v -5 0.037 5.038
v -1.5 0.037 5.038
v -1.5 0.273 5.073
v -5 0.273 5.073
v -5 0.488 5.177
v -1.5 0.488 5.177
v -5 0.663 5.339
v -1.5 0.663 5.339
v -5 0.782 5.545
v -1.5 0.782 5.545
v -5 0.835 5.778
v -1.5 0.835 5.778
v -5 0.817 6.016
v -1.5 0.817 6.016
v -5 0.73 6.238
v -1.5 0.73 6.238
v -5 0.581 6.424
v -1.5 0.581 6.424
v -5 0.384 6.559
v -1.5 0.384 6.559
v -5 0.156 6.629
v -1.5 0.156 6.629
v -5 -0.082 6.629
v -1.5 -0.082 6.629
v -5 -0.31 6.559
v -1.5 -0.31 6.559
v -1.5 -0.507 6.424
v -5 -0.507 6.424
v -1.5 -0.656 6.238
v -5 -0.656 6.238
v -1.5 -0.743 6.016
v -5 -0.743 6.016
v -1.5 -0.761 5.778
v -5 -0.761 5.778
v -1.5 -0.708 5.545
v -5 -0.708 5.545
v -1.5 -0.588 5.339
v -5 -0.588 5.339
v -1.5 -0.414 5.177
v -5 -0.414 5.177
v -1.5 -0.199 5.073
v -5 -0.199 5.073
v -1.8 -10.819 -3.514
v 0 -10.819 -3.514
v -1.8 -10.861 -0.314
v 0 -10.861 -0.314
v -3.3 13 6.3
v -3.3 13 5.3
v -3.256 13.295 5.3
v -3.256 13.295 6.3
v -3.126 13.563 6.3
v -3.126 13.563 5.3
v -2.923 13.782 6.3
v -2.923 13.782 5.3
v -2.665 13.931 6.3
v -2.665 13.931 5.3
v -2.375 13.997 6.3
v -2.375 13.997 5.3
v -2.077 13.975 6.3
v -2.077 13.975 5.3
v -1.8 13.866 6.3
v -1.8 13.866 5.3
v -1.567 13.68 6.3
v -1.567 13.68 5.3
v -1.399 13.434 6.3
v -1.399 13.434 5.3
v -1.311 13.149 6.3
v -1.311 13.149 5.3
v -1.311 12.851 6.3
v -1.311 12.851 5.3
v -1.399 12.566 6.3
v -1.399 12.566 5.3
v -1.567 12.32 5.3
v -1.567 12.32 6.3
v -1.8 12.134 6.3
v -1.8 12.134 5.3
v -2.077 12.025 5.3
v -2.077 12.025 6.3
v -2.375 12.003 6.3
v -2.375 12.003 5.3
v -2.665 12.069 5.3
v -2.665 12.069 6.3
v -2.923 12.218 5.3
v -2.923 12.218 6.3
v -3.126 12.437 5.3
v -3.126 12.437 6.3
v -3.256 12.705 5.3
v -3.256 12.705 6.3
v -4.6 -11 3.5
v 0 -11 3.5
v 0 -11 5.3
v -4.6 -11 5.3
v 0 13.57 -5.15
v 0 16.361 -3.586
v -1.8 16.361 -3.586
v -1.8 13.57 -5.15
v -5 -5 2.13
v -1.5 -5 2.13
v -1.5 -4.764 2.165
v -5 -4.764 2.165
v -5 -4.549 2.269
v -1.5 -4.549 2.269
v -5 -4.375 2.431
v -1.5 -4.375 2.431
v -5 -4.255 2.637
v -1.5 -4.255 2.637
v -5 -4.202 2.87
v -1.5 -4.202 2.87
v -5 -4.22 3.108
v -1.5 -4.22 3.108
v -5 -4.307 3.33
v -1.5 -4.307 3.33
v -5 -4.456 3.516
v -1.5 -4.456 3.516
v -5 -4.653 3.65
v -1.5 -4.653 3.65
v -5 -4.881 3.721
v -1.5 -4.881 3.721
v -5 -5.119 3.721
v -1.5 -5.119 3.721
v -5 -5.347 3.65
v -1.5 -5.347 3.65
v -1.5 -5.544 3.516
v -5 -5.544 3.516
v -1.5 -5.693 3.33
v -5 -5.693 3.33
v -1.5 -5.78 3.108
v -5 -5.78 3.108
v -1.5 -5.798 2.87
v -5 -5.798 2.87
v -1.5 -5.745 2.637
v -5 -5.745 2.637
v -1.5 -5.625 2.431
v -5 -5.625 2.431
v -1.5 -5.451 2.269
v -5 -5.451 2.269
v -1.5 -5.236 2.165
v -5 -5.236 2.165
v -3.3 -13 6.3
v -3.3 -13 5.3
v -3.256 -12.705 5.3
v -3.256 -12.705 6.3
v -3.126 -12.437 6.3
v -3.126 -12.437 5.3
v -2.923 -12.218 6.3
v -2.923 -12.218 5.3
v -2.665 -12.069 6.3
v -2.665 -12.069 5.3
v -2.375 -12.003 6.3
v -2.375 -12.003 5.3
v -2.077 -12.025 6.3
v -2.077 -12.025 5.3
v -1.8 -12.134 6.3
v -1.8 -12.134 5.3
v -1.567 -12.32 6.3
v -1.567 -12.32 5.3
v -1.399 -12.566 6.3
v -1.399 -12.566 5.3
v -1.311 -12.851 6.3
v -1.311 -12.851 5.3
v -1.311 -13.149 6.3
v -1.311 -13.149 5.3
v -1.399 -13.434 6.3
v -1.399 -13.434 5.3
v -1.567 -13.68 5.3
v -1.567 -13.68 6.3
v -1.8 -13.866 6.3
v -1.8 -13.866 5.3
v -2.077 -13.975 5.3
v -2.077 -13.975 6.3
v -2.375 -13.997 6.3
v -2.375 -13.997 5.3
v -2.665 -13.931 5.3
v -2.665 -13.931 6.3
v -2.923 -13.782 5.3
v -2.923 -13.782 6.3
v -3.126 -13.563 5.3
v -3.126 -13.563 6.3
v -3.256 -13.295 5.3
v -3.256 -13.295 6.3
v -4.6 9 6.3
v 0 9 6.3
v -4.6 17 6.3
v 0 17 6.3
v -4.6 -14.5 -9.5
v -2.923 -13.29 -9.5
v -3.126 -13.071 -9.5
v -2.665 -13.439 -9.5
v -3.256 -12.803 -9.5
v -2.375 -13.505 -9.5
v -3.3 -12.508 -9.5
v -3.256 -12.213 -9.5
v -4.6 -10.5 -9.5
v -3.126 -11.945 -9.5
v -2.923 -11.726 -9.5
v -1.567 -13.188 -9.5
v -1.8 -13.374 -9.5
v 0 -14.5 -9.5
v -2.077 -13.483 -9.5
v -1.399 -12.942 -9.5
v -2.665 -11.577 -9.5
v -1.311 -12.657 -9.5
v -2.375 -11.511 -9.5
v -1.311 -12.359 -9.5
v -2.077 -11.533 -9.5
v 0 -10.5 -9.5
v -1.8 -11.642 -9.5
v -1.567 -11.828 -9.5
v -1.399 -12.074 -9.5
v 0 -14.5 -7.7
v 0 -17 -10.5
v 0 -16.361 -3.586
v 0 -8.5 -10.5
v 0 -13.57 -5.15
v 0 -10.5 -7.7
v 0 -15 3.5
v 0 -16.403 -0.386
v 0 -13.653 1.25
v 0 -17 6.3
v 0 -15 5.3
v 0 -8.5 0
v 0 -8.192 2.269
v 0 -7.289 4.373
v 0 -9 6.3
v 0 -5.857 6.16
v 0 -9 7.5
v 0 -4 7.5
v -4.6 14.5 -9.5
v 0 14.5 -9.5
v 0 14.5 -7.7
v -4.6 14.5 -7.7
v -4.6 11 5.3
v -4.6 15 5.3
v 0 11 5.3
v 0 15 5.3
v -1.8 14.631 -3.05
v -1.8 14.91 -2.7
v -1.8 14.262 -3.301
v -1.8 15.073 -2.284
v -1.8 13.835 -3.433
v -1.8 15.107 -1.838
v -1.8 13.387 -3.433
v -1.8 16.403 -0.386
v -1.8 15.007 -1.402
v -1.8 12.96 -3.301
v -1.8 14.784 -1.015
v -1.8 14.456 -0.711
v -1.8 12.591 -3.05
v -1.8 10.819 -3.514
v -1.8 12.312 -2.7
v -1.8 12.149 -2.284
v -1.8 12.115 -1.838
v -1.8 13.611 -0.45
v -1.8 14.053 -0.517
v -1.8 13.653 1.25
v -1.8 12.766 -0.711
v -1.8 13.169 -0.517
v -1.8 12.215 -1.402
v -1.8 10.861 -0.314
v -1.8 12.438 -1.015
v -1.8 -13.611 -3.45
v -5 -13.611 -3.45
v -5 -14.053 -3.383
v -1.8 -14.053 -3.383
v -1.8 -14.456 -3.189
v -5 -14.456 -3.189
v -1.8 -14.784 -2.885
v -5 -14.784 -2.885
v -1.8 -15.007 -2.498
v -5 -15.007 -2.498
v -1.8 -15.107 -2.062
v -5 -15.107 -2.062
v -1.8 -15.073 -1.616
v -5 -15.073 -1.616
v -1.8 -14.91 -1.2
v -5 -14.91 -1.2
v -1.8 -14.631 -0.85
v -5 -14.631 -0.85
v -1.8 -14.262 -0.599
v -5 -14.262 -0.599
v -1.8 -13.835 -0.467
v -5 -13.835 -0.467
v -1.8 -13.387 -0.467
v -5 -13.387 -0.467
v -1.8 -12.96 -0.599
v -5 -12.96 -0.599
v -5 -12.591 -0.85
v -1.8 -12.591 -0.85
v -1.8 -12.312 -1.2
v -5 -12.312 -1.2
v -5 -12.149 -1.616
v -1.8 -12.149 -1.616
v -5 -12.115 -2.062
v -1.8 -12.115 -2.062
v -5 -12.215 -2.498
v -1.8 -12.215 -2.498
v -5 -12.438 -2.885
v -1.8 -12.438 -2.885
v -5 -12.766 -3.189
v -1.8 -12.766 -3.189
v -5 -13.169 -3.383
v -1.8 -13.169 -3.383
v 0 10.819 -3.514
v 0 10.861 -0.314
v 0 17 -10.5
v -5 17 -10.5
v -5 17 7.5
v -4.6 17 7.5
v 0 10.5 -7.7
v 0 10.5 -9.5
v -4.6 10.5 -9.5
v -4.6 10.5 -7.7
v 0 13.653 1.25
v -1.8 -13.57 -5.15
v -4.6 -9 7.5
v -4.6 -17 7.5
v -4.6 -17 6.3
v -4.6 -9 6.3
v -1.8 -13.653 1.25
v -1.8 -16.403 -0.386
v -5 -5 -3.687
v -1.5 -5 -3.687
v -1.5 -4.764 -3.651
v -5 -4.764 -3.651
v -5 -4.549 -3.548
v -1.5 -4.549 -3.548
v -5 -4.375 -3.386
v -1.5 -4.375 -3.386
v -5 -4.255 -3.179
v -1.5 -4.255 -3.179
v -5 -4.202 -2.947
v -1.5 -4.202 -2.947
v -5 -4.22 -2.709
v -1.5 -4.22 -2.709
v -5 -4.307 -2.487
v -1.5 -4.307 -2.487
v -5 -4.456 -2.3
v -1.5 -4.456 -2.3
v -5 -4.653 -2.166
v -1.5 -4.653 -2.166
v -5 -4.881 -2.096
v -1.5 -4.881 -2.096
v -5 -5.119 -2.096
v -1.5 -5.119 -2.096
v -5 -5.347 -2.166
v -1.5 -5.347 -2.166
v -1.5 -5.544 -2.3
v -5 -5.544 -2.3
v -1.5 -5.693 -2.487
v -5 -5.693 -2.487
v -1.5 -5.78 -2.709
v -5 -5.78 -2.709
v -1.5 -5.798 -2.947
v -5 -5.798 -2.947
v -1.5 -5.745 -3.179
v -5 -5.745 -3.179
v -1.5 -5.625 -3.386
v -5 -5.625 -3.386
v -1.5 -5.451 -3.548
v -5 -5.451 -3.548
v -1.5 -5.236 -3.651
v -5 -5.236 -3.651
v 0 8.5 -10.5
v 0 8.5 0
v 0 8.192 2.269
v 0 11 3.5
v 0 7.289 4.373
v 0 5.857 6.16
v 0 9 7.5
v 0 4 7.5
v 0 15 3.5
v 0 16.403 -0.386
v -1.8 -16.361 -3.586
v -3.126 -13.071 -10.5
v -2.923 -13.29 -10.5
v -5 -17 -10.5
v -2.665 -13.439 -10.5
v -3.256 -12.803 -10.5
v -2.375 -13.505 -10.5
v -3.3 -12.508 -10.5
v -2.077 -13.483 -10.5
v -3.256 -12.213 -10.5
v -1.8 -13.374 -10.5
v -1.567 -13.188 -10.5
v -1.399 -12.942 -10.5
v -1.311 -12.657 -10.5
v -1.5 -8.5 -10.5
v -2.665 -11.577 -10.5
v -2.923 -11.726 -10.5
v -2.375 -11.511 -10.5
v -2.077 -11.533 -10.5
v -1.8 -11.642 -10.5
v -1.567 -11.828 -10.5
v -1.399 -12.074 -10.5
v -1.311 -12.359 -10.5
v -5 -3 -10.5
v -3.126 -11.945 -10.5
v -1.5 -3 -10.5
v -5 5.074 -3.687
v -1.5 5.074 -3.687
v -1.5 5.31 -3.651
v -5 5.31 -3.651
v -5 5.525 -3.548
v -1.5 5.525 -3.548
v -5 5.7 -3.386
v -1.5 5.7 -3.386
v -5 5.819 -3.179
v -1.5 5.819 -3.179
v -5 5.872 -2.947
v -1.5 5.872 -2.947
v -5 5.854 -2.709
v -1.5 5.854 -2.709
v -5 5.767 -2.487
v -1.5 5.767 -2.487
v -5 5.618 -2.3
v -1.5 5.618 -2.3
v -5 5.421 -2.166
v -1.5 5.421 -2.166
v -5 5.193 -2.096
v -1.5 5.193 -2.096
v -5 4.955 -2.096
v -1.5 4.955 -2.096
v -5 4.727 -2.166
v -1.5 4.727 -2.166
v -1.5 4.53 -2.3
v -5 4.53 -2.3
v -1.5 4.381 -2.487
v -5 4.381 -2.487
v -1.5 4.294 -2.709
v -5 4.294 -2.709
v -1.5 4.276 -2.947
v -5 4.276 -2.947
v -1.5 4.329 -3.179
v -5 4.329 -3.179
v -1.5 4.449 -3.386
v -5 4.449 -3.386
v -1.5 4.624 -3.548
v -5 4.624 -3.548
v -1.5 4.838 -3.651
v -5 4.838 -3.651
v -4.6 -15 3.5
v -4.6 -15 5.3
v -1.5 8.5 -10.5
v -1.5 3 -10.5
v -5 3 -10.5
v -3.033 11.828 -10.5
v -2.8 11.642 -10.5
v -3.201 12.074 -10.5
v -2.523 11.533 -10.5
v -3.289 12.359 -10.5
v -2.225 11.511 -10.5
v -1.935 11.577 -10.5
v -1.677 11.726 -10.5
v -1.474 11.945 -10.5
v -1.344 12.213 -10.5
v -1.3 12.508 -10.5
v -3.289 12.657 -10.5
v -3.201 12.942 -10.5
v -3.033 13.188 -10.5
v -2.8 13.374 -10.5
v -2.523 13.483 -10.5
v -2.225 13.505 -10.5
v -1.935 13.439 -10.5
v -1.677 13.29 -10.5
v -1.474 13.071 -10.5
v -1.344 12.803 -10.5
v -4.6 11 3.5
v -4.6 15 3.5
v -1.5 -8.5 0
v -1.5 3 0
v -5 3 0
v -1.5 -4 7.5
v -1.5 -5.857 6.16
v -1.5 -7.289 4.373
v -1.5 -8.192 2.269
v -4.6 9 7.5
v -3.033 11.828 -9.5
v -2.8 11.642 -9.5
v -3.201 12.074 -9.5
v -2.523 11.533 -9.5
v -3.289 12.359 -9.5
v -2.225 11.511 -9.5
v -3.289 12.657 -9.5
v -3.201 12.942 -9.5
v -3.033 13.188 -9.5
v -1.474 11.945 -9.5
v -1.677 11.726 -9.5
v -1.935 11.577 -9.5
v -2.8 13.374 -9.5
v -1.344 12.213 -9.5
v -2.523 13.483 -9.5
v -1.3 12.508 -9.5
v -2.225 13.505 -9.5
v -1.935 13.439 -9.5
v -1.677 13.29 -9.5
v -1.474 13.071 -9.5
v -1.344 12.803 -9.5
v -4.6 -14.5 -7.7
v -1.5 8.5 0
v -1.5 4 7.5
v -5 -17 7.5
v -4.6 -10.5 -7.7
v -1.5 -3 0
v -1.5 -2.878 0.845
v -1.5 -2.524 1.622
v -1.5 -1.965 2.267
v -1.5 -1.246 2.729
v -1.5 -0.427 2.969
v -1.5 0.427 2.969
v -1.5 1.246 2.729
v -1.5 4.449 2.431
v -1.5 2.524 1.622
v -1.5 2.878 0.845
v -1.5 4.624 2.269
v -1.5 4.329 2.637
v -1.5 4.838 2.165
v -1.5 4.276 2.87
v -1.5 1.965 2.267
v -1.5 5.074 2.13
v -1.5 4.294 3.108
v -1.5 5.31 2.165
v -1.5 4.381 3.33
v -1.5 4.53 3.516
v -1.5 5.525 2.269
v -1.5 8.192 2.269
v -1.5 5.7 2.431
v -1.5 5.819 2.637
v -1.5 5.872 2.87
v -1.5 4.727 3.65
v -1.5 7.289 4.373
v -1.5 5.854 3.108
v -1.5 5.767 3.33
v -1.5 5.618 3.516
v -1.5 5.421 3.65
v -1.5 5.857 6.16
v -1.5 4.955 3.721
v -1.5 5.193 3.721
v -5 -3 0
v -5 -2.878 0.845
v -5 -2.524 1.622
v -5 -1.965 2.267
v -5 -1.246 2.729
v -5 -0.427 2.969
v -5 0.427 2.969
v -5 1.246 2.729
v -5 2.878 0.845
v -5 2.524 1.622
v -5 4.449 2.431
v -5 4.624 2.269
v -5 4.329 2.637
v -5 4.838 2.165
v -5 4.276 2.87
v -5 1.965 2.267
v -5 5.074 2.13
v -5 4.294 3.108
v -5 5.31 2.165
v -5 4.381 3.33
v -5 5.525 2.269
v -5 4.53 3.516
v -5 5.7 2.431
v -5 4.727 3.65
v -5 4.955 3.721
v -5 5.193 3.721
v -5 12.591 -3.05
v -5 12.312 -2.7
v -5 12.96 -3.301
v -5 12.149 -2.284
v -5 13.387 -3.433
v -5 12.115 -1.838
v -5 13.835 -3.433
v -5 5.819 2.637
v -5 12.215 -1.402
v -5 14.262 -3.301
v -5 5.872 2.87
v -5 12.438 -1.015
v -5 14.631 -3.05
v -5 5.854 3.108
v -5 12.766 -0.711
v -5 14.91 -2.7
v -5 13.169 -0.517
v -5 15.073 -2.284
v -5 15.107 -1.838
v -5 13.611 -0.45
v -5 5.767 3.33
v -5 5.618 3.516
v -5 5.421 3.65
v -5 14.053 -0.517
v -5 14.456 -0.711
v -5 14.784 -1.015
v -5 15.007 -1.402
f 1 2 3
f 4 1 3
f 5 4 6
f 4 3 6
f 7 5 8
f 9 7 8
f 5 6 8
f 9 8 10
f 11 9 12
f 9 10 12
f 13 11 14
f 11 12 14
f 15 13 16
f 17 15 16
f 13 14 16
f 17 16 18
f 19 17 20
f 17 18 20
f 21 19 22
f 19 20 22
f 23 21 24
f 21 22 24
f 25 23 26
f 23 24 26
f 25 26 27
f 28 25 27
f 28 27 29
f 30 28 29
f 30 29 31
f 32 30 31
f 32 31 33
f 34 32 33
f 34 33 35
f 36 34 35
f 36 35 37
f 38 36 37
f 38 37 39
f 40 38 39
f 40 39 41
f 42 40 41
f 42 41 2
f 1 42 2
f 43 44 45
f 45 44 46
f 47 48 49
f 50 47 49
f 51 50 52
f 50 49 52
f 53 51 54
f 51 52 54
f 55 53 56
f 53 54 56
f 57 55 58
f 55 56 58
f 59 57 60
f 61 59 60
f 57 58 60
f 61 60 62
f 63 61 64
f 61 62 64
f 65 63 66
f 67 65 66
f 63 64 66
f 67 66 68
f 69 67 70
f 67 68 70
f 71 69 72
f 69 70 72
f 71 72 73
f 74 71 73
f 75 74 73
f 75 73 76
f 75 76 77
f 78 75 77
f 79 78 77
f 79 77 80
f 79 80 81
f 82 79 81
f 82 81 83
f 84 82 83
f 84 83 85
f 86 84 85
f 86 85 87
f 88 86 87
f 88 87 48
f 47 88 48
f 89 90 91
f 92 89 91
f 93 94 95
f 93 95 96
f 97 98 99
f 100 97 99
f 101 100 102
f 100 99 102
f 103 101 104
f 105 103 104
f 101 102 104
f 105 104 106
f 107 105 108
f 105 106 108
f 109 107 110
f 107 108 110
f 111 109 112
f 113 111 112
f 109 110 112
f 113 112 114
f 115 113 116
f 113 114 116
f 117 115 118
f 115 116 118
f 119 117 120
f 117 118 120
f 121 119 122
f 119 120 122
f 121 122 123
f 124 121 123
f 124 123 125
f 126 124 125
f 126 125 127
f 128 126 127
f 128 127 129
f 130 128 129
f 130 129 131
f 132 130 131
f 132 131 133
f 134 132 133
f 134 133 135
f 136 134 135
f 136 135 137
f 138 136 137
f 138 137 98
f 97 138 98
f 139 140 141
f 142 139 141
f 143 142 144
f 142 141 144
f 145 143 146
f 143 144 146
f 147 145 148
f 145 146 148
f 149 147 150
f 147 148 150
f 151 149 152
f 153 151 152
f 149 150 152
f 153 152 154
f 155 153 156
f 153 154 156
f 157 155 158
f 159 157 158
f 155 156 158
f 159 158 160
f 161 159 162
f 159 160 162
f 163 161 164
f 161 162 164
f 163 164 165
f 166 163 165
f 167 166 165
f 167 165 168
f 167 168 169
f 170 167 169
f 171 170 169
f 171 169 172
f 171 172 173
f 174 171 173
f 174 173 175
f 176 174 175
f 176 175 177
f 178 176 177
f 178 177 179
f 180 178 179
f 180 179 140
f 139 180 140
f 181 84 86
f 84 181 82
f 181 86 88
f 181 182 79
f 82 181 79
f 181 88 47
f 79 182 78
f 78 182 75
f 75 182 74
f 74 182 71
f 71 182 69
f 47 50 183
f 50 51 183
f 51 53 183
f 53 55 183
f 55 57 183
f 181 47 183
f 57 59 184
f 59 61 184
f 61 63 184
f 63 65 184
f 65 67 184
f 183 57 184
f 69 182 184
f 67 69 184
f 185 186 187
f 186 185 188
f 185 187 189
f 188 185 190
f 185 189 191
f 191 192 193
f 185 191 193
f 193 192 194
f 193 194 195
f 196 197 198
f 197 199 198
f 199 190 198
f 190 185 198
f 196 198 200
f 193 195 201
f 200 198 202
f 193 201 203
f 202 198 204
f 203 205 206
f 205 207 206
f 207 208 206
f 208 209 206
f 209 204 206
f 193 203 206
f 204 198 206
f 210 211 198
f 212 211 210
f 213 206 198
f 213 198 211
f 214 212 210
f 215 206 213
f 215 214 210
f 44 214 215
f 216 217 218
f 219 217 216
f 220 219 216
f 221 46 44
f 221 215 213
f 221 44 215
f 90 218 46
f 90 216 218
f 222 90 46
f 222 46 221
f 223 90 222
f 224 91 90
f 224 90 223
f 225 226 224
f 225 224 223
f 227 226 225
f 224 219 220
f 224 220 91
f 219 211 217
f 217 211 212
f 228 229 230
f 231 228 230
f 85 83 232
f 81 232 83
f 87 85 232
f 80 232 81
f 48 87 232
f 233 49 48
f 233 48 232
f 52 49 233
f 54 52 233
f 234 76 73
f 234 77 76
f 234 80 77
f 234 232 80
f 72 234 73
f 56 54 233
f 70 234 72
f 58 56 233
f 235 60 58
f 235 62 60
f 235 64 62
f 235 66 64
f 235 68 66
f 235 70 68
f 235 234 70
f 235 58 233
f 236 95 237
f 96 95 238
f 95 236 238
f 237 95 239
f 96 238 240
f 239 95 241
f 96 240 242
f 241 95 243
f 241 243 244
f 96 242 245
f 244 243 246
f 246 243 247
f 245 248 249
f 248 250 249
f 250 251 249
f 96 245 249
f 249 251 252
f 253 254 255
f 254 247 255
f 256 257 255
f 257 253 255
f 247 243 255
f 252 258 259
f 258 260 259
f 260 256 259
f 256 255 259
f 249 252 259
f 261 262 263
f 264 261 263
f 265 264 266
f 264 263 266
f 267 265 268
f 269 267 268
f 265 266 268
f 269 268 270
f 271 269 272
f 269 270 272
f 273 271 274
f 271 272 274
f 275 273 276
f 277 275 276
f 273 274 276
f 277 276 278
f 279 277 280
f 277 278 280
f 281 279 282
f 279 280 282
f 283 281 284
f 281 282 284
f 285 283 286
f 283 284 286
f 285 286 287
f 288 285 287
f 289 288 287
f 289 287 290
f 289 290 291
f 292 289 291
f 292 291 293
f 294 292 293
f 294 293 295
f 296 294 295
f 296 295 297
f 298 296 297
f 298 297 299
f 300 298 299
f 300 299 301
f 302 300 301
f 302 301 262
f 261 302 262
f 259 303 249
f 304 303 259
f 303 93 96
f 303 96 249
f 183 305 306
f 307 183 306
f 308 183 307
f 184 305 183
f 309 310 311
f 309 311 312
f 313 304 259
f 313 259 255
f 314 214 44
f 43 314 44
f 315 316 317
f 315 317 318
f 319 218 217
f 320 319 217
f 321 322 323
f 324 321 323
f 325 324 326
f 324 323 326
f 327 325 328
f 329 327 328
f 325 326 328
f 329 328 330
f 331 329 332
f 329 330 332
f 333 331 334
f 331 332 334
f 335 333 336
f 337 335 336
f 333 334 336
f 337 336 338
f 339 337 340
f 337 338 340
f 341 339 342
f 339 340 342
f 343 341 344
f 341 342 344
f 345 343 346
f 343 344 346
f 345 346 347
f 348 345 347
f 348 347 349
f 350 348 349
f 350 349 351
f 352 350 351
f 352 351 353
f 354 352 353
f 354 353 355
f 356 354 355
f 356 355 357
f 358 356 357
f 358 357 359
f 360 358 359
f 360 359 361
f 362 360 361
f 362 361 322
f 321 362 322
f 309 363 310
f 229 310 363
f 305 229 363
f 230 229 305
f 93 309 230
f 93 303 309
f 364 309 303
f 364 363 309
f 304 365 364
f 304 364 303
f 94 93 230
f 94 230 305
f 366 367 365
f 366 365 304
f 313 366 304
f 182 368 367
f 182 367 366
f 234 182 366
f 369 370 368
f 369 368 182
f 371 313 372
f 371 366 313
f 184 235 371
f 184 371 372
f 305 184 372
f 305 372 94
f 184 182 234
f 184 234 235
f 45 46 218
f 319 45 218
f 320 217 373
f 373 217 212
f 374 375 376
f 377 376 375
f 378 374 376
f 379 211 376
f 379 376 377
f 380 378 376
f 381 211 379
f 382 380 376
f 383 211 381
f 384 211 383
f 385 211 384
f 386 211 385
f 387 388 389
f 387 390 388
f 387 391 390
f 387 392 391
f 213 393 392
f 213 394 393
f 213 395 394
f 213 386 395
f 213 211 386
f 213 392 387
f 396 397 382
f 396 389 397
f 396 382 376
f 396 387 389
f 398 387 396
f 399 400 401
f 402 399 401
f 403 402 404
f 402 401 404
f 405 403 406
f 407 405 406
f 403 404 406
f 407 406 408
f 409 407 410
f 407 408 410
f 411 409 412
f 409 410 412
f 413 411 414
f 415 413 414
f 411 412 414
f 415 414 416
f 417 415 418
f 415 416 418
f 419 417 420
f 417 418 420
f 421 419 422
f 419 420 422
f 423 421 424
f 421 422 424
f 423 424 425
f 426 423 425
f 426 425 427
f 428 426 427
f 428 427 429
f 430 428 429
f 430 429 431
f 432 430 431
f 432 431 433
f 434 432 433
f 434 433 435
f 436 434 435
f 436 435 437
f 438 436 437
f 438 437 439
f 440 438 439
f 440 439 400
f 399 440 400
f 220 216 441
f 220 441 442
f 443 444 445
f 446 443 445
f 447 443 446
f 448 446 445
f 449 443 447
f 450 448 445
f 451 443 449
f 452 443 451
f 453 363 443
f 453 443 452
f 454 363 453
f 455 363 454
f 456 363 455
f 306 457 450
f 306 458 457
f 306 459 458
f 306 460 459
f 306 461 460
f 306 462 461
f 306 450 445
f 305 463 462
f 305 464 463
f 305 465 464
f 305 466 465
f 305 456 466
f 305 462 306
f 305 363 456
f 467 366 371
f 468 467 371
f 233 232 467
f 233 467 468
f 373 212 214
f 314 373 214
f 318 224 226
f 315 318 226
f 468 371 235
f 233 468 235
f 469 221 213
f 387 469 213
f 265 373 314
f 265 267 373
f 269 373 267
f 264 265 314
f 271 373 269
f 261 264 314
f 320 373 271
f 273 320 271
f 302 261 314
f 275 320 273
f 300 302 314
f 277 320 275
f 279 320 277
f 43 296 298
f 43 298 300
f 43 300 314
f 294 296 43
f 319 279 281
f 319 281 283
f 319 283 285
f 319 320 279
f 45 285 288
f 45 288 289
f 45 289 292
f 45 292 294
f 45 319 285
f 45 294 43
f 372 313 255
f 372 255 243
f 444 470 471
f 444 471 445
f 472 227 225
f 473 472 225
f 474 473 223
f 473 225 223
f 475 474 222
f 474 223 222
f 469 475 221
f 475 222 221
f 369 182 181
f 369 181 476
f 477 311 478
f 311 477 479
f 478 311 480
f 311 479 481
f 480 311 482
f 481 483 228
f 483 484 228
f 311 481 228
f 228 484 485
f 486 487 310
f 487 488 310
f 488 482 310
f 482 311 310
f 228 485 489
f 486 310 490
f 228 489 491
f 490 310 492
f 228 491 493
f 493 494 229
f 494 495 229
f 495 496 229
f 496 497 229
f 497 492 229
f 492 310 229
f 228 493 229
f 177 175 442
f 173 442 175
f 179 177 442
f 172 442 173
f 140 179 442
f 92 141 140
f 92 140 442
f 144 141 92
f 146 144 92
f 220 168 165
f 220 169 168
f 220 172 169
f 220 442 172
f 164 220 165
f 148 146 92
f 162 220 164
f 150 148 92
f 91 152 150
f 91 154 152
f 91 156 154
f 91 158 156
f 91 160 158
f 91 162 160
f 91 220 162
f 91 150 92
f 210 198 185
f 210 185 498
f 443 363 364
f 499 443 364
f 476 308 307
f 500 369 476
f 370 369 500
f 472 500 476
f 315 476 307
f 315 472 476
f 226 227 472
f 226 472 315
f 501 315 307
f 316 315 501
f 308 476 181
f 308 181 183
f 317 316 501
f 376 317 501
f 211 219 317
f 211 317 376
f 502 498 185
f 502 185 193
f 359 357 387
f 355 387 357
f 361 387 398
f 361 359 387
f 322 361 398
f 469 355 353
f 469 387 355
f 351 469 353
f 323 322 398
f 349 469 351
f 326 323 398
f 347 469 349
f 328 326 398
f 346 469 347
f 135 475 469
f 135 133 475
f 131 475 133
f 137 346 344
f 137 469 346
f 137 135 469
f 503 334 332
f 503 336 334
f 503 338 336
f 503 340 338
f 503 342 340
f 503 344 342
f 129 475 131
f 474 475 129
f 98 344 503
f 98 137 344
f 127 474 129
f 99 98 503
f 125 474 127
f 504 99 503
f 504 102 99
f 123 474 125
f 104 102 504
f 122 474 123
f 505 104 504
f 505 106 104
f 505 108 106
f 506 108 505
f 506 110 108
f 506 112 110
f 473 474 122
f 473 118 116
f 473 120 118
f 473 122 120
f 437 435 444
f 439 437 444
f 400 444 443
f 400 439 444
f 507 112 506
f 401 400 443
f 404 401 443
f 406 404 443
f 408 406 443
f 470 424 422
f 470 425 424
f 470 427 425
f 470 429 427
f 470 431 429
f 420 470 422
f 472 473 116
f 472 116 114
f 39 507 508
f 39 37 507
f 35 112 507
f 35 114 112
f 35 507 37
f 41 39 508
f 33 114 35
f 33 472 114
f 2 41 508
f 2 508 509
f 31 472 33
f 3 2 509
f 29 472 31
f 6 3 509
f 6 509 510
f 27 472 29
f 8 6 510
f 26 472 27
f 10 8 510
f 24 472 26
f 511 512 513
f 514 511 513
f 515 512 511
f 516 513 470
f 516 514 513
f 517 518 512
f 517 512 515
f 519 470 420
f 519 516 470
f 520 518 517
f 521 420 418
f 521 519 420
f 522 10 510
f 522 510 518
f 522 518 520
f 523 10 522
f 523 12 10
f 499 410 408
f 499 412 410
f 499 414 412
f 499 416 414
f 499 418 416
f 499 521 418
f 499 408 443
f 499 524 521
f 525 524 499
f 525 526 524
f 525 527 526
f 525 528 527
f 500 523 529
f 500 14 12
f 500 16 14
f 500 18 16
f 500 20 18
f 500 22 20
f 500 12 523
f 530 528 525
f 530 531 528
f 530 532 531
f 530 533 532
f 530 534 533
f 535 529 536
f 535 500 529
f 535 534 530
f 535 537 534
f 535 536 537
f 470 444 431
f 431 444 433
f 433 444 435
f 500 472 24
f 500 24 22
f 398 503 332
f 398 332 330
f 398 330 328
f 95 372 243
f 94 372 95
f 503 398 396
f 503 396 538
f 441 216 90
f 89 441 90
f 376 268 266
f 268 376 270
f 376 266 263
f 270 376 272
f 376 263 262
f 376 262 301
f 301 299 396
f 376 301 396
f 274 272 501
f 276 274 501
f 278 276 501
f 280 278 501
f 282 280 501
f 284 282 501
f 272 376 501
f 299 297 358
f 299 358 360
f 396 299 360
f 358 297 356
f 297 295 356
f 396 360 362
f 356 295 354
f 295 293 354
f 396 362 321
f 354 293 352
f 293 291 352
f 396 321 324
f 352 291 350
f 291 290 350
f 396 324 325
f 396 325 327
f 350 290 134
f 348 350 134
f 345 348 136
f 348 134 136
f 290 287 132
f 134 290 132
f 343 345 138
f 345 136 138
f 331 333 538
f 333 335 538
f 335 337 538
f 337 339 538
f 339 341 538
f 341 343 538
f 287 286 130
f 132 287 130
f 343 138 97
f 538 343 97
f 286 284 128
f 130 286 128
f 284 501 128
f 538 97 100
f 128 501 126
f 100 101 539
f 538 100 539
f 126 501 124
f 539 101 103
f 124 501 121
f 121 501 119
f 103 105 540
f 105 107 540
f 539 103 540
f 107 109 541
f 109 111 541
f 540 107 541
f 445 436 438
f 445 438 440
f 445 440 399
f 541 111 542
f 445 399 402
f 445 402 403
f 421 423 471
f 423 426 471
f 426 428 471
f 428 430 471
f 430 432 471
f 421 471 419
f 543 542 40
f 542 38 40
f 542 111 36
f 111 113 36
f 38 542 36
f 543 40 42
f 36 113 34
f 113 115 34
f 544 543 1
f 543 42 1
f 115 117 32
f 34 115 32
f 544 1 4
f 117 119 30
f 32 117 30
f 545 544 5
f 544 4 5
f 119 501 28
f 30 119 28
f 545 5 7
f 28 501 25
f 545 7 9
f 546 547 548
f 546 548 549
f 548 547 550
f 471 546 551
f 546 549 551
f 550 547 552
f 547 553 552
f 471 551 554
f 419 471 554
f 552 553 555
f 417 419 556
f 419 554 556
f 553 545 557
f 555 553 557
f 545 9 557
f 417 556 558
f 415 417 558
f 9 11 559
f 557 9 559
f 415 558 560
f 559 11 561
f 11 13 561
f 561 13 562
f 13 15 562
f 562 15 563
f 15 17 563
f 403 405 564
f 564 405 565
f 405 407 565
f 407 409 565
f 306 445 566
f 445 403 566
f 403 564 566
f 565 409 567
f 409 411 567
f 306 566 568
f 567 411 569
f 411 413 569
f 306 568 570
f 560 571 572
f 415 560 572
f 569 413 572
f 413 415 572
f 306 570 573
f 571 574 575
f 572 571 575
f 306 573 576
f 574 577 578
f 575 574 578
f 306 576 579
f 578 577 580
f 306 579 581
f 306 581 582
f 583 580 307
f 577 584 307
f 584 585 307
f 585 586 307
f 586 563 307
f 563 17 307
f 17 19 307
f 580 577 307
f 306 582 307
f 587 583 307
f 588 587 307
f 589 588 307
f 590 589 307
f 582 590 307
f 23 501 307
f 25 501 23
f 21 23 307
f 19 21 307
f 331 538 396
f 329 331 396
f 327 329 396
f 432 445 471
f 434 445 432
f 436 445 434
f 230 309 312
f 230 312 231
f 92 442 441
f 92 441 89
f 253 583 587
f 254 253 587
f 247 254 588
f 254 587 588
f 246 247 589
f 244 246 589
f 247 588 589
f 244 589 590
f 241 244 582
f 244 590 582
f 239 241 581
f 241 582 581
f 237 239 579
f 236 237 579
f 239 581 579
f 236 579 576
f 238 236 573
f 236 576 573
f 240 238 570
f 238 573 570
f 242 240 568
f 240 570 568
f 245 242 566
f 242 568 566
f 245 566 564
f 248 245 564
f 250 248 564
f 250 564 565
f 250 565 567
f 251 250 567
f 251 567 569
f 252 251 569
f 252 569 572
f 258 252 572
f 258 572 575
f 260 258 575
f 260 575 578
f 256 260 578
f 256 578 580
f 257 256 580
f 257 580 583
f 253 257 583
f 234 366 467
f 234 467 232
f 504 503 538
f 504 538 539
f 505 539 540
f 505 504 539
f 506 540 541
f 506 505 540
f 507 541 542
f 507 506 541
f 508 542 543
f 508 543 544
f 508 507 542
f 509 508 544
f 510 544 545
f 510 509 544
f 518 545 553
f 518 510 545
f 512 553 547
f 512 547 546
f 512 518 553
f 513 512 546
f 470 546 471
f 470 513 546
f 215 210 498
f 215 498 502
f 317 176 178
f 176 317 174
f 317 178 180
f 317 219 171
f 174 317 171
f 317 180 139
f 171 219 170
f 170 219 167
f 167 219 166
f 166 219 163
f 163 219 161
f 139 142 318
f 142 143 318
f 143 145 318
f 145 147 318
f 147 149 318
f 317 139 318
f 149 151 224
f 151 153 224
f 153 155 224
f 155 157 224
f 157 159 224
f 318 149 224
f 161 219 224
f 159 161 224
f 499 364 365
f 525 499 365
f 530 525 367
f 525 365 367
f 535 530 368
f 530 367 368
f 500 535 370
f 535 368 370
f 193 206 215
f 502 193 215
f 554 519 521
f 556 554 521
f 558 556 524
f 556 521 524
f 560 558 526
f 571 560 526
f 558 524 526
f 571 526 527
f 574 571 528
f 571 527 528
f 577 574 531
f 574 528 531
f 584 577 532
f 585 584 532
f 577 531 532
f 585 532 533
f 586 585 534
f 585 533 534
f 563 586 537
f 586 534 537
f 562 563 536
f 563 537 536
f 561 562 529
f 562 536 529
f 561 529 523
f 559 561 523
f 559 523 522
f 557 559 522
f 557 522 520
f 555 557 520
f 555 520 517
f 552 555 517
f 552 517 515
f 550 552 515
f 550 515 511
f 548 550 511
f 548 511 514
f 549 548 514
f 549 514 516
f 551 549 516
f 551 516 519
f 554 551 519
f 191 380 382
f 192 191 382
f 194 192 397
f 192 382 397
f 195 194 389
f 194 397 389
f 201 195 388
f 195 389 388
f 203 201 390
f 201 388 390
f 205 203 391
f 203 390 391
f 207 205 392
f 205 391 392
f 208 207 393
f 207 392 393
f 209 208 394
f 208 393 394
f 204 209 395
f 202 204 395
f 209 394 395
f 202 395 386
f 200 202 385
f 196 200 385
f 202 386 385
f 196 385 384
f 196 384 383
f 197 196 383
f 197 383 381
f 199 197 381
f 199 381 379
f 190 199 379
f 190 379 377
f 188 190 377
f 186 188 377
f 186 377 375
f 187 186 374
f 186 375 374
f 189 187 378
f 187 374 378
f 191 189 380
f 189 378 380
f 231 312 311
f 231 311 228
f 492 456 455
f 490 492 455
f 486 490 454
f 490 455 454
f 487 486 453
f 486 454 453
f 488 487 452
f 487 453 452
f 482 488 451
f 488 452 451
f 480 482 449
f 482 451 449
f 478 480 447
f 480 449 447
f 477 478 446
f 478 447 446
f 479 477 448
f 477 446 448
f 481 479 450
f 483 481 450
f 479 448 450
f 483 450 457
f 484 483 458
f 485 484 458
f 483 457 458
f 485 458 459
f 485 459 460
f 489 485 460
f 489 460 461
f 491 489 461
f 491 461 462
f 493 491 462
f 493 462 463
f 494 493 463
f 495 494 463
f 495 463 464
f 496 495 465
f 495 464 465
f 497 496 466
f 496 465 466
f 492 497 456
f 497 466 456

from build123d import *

# Parameters (mm, degrees)
SKETCH_1_R          = 0.8
EXTRUDE_5_DEPTH     = 5
SKETCH_6_R          = 0.8
CUT_EXTRUDE_1_DEPTH = 1.5
SKETCH_7_R          = 1.5
CUT_EXTRUDE_2_DEPTH = 21.597329924
CUT_EXTRUDE_4_DEPTH = 1.8
SKETCH_9_R          = 1
CUT_EXTRUDE_5_DEPTH = 1
SKETCH_10_W         = 4
SKETCH_10_H         = 1.8
SKETCH_10_W_2       = 8
SKETCH_10_H_2       = 1.2
CUT_EXTRUDE_6_DEPTH = 4.6
SKETCH_12_R         = 1
CUT_EXTRUDE_7_DEPTH = 24.741103597


with BuildPart() as part:
    # ｽｹｯﾁ1 → ﾎﾞｽ - 押し出し5 (new body)
    # profile 1 of 3: a face of its own
    with BuildSketch(Plane.YZ):
        with BuildLine():
            Line((-3, -10.5), (-3, -7.95298686))
            ThreePointArc((-3, -7.95298686), (-8.482257997, -0.548907345), (-4, 7.5))
            Line((-4, 7.5), (-17, 7.5))
            Line((-17, 7.5), (-17, -10.5))
            Line((-17, -10.5), (-3, -10.5))
        make_face()
    # profile 2 of 3: a face of its own
    with BuildSketch(Plane.YZ):
        with BuildLine():
            ThreePointArc((-3, 0), (0, 3), (3, 0))
            Line((3, 0), (3, -7.95298686))
            ThreePointArc((3, -7.95298686), (6.991065727, -4.834769901), (8.5, 0))
            ThreePointArc((8.5, 0), (7.288689869, 4.373213921), (4, 7.5))
            Line((4, 7.5), (-4, 7.5))
            ThreePointArc((-4, 7.5), (-8.482257997, -0.548907345), (-3, -7.95298686))
            Line((-3, -7.95298686), (-3, 0))
        make_face()
        with Locations(Location((-5, -2.886751346, 0), (0, 0, 270))):
            Circle(SKETCH_1_R, mode=Mode.SUBTRACT)
        with Locations(Location((5.074182173, -2.886751346, 0), (0, 0, 270))):
            Circle(SKETCH_1_R, mode=Mode.SUBTRACT)
        with Locations(Location((-5, 2.929580443, 0), (0, 0, 270))):
            Circle(SKETCH_1_R, mode=Mode.SUBTRACT)
        with Locations(Location((5.074182173, 2.929580443, 0), (0, 0, 270))):
            Circle(SKETCH_1_R, mode=Mode.SUBTRACT)
        with Locations(Location((0.037091086, 5.837746338, 0), (0, 0, 270))):
            Circle(SKETCH_1_R, mode=Mode.SUBTRACT)
    # profile 3 of 3: a face of its own
    with BuildSketch(Plane.YZ):
        with BuildLine():
            ThreePointArc((8.5, 0), (6.991065727, -4.834769901), (3, -7.95298686))
            Line((3, -7.95298686), (3, -10.5))
            Line((3, -10.5), (17, -10.5))
            Line((17, -10.5), (17, 7.5))
            Line((17, 7.5), (4, 7.5))
            ThreePointArc((4, 7.5), (7.288689869, 4.373213921), (8.5, 0))
        make_face()
    extrude(amount=-EXTRUDE_5_DEPTH)

    # ｽｹｯﾁ6 → ｶｯﾄ - 押し出し1 (cut)
    # profile 1 of 5: a face of its own
    with BuildSketch(Plane.YZ):
        with BuildLine():
            ThreePointArc((-4, 7.5), (-7.288689869, 4.373213921), (-8.5, 0))
            Line((-8.5, 0), (-3, 0))
            ThreePointArc((-3, 0), (0, 3), (3, 0))
            Line((3, 0), (8.5, 0))
            ThreePointArc((8.5, 0), (7.288689869, 4.373213921), (4, 7.5))
            Line((4, 7.5), (-4, 7.5))
        make_face()
        with Locations(Location((-5, 2.929580443, 0), (0, 0, 270))):
            Circle(SKETCH_6_R, mode=Mode.SUBTRACT)
        with Locations(Location((5.074182173, 2.929580443, 0), (0, 0, 270))):
            Circle(SKETCH_6_R, mode=Mode.SUBTRACT)
        with Locations(Location((0.037091086, 5.837746338, 0), (0, 0, 270))):
            Circle(SKETCH_6_R, mode=Mode.SUBTRACT)
    # profile 2 of 5: a face of its own
    with BuildSketch(Plane.YZ):
        with BuildLine():
            Line((-3, 0), (-8.5, 0))
            ThreePointArc((-8.5, 0), (-6.991065727, -4.834769901), (-3, -7.95298686))
            Line((-3, -7.95298686), (-3, 0))
        make_face()
        with Locations(Location((-5, -2.886751346, 0), (0, 0, 270))):
            Circle(SKETCH_6_R, mode=Mode.SUBTRACT)
    # profile 3 of 5: a face of its own
    with BuildSketch(Plane.YZ):
        with BuildLine():
            Line((8.5, 0), (3, 0))
            Line((3, 0), (3, -7.95298686))
            ThreePointArc((3, -7.95298686), (6.991065727, -4.834769901), (8.5, 0))
        make_face()
        with Locations(Location((5.074182173, -2.886751346, 0), (0, 0, 270))):
            Circle(SKETCH_6_R, mode=Mode.SUBTRACT)
    # profile 4 of 5: a face of its own
    with BuildSketch(Plane.YZ):
        with BuildLine():
            ThreePointArc((8.5, 0), (6.991065727, -4.834769901), (3, -7.95298686))
            Line((3, -7.95298686), (3, -10.5))
            Line((3, -10.5), (8.5, -10.5))
            Line((8.5, -10.5), (8.5, 0))
        make_face()
    # profile 5 of 5: a face of its own
    with BuildSketch(Plane.YZ):
        with BuildLine():
            ThreePointArc((-3, -7.95298686), (-6.991065727, -4.834769901), (-8.5, 0))
            Line((-8.5, 0), (-8.5, -10.5))
            Line((-8.5, -10.5), (-3, -10.5))
            Line((-3, -10.5), (-3, -7.95298686))
        make_face()
    extrude(amount=-CUT_EXTRUDE_1_DEPTH, mode=Mode.SUBTRACT)

    # ｽｹｯﾁ7 → ｶｯﾄ - 押し出し2 (cut, through all)
    with BuildSketch(Plane(origin=(-5, 0, 0), x_dir=(0, -1, 0), z_dir=(-1, 0, 0))):
        with Locations(Location((-13.611024943, -1.95, 0), (0, 0, 90))):
            Circle(SKETCH_7_R)
        with Locations(Location((13.611024943, -1.95, 0), (0, 0, 270))):
            Circle(SKETCH_7_R)
    extrude(amount=-CUT_EXTRUDE_2_DEPTH, mode=Mode.SUBTRACT)

    # ｽｹｯﾁ8 → ｶｯﾄ - 押し出し4 (cut)
    with BuildSketch(Plane.YZ):
        Polygon((10.81922748, -3.513926764), (10.860725904, -0.314195857), (13.652523367, 1.249730908), (16.402822406, -0.386073236), (16.361323982, -3.585804143), (13.569526519, -5.149730908), align=None)
        Polygon((-10.860725904, -0.314195857), (-13.652523367, 1.249730908), (-16.402822406, -0.386073236), (-16.361323982, -3.585804143), (-13.569526519, -5.149730908), (-10.81922748, -3.513926764), align=None)
    extrude(amount=-CUT_EXTRUDE_4_DEPTH, mode=Mode.SUBTRACT)

    # ｽｹｯﾁ9 → ｶｯﾄ - 押し出し5 (cut)
    with BuildSketch(Plane(origin=(0, 0, -10.5), x_dir=(1, 0, 0), z_dir=(0, 0, -1))):
        with Locations(Location((-2.3, 12.508141571, 0), (0, 0, 180))):
            Circle(SKETCH_9_R)
        with Locations((-2.3, -12.508141571)):
            Circle(SKETCH_9_R)
    extrude(amount=-CUT_EXTRUDE_5_DEPTH, mode=Mode.SUBTRACT)

    # ｽｹｯﾁ10 → ｶｯﾄ - 押し出し6 (cut)
    with BuildSketch(Plane.YZ):
        with Locations((-12.5, -8.6)):
            Rectangle(SKETCH_10_W, SKETCH_10_H)
        with Locations((12.5, -8.6)):
            Rectangle(SKETCH_10_W, SKETCH_10_H)
        with Locations((-13, 4.4)):
            Rectangle(SKETCH_10_W, SKETCH_10_H)
        with Locations((13, 4.4)):
            Rectangle(SKETCH_10_W, SKETCH_10_H)
        with Locations((-13, 6.9)):
            Rectangle(SKETCH_10_W_2, SKETCH_10_H_2)
        with Locations((13, 6.9)):
            Rectangle(SKETCH_10_W_2, SKETCH_10_H_2)
    extrude(amount=-CUT_EXTRUDE_6_DEPTH, mode=Mode.SUBTRACT)

    # ｽｹｯﾁ12 → ｶｯﾄ - 押し出し7 (cut, through all)
    with BuildSketch(Plane(origin=(0, 0, 5.3), x_dir=(1, 0, 0), z_dir=(0, 0, -1))):
        with Locations(Location((-2.3, 13, 0), (0, 0, 180))):
            Circle(SKETCH_12_R)
        with Locations(Location((-2.3, -13, 0), (0, 0, 180))):
            Circle(SKETCH_12_R)
    extrude(amount=-CUT_EXTRUDE_7_DEPTH, mode=Mode.SUBTRACT)


solid = part.part
